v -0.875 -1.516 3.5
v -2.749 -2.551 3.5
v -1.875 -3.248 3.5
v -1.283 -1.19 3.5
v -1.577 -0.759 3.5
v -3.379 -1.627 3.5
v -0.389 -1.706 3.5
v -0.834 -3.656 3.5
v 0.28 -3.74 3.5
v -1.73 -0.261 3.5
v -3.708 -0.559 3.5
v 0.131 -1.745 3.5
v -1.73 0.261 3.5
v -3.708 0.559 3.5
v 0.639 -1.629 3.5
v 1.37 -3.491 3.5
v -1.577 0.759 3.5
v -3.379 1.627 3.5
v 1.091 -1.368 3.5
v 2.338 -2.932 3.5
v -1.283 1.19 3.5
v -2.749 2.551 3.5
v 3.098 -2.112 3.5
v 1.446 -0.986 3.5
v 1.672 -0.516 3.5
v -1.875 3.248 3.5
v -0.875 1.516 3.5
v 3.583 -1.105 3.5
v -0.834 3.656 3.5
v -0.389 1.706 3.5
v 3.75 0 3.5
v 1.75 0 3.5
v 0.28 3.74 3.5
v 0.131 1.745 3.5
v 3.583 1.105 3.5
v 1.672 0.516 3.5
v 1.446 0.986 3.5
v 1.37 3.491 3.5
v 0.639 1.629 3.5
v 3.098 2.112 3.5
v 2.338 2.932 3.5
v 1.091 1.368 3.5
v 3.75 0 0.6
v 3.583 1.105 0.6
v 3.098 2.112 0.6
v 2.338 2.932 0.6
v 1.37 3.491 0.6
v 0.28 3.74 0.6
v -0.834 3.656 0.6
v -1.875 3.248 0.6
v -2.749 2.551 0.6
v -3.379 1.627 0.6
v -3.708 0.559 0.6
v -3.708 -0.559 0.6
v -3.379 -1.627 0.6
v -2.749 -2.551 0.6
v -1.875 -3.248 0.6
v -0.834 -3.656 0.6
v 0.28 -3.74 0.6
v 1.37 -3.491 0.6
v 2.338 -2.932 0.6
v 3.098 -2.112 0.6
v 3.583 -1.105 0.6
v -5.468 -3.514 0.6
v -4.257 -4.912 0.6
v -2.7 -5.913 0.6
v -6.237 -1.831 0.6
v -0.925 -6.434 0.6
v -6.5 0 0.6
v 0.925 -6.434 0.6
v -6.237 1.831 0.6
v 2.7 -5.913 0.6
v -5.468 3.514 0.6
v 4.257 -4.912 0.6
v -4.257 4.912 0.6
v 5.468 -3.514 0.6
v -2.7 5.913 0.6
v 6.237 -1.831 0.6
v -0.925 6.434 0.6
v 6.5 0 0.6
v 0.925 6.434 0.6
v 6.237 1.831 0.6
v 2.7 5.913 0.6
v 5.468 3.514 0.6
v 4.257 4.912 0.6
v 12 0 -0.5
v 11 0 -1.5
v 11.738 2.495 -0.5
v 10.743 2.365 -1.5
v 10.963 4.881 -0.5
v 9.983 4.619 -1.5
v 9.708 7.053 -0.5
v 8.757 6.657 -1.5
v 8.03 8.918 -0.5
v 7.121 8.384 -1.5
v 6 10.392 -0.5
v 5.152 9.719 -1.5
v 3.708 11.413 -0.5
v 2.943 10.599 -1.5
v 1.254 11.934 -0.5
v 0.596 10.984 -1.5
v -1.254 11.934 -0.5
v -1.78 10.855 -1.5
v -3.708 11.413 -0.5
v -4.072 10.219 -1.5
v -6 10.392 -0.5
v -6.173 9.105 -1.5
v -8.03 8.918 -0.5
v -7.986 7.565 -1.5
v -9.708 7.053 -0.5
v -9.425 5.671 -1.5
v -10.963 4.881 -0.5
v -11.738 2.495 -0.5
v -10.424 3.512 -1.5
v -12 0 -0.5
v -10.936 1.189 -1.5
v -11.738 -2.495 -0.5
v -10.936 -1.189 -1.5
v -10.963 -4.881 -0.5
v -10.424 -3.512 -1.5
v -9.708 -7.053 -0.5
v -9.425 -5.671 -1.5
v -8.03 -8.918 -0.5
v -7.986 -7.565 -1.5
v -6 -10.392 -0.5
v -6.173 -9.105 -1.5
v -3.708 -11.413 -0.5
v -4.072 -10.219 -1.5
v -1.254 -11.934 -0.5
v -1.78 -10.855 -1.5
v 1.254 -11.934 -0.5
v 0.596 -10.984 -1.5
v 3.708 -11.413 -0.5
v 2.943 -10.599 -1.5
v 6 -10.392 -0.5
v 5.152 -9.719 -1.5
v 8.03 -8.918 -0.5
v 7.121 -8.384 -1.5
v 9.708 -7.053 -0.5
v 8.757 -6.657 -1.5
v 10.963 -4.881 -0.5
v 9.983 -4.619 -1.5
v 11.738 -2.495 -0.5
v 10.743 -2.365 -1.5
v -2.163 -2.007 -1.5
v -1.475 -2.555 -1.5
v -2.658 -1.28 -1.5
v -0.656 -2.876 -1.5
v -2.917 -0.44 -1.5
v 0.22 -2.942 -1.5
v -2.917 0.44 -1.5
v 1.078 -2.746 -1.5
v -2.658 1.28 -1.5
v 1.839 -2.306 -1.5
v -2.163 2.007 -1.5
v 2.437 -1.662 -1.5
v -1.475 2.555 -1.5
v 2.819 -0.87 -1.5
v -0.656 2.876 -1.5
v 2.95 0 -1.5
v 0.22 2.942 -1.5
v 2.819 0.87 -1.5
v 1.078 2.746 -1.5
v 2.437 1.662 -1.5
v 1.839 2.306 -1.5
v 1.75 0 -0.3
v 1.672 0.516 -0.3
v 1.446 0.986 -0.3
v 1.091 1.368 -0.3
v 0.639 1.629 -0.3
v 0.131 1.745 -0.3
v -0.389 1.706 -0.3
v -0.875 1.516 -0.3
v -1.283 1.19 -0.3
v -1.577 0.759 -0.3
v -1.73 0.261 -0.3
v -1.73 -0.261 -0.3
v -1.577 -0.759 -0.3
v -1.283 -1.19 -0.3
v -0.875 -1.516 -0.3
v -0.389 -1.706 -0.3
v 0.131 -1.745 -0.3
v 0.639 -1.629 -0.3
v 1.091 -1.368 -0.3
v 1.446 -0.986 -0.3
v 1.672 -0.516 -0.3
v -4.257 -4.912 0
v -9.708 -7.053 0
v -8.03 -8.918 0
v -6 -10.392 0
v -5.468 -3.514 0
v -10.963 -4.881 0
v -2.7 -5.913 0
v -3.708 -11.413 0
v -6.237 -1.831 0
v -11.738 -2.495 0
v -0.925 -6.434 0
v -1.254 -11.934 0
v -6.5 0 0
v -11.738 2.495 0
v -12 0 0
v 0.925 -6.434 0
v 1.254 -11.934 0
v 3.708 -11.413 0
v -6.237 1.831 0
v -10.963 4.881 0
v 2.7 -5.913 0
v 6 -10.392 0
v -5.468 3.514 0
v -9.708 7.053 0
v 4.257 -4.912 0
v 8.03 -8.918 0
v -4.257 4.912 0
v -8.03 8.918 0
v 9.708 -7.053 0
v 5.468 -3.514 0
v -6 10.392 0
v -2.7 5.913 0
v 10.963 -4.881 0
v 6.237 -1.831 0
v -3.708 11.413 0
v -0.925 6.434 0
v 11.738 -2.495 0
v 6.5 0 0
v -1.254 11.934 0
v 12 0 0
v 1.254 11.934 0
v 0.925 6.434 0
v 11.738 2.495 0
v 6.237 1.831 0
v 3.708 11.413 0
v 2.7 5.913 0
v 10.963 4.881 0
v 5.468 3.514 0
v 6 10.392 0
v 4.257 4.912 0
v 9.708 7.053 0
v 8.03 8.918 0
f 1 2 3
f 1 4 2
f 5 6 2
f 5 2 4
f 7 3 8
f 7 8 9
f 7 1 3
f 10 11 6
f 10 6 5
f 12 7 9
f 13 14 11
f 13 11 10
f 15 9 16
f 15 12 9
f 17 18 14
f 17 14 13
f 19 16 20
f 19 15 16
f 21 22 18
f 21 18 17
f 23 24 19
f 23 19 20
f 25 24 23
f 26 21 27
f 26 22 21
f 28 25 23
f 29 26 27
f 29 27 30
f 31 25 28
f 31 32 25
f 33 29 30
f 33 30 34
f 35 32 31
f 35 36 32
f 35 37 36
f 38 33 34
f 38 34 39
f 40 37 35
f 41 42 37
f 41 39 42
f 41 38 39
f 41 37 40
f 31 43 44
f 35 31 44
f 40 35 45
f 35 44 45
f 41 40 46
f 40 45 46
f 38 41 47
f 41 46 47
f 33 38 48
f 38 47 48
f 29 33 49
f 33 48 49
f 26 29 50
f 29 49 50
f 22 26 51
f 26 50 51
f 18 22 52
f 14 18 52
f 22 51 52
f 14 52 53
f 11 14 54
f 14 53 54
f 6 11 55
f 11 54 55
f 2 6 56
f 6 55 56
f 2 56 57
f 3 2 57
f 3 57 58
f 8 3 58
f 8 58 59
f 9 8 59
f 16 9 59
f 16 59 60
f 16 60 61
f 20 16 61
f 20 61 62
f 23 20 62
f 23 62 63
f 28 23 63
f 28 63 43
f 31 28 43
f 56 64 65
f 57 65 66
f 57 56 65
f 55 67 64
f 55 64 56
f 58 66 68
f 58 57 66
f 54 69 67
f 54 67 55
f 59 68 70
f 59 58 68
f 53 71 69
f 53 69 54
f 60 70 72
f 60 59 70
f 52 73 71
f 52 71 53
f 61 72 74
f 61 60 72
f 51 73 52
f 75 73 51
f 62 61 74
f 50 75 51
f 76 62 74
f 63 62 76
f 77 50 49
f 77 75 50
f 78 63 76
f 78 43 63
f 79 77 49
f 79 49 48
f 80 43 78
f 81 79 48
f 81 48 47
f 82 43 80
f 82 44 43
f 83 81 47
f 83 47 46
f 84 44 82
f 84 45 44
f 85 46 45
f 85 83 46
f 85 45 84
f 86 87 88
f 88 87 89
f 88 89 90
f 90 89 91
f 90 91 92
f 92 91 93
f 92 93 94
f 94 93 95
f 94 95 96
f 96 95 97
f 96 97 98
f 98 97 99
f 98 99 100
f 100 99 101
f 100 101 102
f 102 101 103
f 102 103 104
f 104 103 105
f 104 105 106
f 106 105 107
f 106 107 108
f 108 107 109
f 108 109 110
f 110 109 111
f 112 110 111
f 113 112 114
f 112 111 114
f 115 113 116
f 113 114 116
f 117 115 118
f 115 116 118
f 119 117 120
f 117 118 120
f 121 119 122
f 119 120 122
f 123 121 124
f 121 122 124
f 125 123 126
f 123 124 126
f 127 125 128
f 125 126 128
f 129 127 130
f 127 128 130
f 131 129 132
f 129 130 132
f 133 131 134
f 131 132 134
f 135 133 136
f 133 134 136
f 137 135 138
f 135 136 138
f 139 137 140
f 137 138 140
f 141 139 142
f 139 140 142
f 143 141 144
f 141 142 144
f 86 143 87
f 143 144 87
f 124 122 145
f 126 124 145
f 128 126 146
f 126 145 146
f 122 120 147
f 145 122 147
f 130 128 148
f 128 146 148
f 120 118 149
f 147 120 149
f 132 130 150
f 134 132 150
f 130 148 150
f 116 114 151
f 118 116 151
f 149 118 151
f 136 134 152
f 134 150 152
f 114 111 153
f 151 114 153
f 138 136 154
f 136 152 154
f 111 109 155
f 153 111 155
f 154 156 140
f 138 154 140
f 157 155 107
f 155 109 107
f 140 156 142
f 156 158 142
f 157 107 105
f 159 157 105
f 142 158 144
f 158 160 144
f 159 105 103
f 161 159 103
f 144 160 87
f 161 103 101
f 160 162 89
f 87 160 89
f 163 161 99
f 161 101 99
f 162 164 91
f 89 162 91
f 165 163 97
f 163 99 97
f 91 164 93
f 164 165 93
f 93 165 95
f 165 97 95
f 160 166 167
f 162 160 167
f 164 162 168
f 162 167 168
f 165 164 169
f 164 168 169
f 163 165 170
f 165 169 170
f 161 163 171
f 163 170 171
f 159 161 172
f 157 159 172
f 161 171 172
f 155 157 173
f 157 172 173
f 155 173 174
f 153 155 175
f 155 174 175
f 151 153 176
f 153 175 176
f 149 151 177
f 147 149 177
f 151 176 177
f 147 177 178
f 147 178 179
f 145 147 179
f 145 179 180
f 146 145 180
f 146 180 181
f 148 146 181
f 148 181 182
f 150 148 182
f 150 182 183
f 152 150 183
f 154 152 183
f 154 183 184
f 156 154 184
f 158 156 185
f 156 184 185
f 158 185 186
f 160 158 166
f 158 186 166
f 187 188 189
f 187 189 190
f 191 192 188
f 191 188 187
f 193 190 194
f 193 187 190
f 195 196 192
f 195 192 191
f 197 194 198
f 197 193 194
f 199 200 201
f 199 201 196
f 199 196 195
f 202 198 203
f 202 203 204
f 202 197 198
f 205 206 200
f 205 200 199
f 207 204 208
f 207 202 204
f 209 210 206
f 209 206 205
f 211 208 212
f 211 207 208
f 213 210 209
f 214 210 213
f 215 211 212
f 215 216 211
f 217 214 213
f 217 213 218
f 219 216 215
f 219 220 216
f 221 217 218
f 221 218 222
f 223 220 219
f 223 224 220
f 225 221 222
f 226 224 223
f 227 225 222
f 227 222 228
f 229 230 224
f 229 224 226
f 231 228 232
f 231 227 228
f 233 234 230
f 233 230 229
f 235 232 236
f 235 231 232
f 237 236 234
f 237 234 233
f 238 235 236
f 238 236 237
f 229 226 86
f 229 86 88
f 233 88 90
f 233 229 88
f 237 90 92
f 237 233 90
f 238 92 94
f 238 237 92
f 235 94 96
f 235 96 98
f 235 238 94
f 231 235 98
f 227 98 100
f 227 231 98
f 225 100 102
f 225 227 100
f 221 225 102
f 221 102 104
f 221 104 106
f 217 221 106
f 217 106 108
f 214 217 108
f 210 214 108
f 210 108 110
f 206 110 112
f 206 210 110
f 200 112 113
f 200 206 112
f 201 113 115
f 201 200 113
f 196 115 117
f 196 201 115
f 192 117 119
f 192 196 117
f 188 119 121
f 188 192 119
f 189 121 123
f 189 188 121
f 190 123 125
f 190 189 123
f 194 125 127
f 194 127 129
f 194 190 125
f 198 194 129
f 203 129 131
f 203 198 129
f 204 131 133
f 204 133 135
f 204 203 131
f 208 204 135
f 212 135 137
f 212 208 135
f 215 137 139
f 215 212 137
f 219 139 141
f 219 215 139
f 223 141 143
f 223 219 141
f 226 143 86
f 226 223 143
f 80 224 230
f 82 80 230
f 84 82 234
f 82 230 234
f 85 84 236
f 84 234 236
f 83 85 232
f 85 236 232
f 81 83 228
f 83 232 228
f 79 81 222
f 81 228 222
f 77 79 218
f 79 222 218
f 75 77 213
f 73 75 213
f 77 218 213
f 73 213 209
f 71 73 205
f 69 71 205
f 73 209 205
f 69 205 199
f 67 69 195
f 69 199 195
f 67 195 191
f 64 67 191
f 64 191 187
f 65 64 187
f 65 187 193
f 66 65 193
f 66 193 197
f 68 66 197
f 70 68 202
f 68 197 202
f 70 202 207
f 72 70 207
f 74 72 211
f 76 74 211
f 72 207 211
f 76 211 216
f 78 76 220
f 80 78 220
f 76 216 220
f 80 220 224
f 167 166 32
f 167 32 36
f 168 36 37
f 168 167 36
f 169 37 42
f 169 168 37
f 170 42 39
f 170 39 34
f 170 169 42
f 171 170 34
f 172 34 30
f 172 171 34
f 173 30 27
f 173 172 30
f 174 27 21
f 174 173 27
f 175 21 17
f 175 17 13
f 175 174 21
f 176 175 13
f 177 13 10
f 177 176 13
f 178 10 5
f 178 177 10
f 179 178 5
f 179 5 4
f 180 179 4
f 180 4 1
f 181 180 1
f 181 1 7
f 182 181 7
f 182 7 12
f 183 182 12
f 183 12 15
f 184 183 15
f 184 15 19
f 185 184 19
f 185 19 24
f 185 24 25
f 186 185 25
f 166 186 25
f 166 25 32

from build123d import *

# Parameters (mm, degrees)
F0_R     = 12
F0_R_2   = 6.5
F0_R_3   = 3.75
F0_R_4   = 1.75
F1_DEPTH = 1.5
F2_DEPTH = 3.5
F3_DEPTH = 0.6
F4_SIZE  = 1
F5_SIZE  = 1.2


with BuildPart() as f1:
    # F0 (on Top) → F1 (new body)
    with BuildSketch(Plane.XY):
        Circle(F0_R)
        Circle(F0_R_2, mode=Mode.SUBTRACT)
        Circle(F0_R_2)
        Circle(F0_R_3, mode=Mode.SUBTRACT)
        Circle(F0_R_3)
        Circle(F0_R_4, mode=Mode.SUBTRACT)
    extrude(amount=-F1_DEPTH)

    # F0 (on Top) → F2 (join)
    with BuildSketch(Plane.XY):
        Circle(F0_R_3)
        Circle(F0_R_4, mode=Mode.SUBTRACT)
    extrude(amount=F2_DEPTH)

    # F0 (on Top) → F3 (join)
    with BuildSketch(Plane.XY):
        Circle(F0_R_2)
        Circle(F0_R_3, mode=Mode.SUBTRACT)
    extrude(amount=F3_DEPTH)

    # F4
    f4_edges = [f1.edges().sort_by_distance(p)[0] for p in [
        (-12, 0, -1.5),
    ]]
    chamfer(f4_edges, length=F4_SIZE)

    # F5
    f5_edges = [f1.edges().sort_by_distance(p)[0] for p in [
        (-1.75, 0, -1.5),
    ]]
    chamfer(f5_edges, length=F5_SIZE)


solid = f1.part
